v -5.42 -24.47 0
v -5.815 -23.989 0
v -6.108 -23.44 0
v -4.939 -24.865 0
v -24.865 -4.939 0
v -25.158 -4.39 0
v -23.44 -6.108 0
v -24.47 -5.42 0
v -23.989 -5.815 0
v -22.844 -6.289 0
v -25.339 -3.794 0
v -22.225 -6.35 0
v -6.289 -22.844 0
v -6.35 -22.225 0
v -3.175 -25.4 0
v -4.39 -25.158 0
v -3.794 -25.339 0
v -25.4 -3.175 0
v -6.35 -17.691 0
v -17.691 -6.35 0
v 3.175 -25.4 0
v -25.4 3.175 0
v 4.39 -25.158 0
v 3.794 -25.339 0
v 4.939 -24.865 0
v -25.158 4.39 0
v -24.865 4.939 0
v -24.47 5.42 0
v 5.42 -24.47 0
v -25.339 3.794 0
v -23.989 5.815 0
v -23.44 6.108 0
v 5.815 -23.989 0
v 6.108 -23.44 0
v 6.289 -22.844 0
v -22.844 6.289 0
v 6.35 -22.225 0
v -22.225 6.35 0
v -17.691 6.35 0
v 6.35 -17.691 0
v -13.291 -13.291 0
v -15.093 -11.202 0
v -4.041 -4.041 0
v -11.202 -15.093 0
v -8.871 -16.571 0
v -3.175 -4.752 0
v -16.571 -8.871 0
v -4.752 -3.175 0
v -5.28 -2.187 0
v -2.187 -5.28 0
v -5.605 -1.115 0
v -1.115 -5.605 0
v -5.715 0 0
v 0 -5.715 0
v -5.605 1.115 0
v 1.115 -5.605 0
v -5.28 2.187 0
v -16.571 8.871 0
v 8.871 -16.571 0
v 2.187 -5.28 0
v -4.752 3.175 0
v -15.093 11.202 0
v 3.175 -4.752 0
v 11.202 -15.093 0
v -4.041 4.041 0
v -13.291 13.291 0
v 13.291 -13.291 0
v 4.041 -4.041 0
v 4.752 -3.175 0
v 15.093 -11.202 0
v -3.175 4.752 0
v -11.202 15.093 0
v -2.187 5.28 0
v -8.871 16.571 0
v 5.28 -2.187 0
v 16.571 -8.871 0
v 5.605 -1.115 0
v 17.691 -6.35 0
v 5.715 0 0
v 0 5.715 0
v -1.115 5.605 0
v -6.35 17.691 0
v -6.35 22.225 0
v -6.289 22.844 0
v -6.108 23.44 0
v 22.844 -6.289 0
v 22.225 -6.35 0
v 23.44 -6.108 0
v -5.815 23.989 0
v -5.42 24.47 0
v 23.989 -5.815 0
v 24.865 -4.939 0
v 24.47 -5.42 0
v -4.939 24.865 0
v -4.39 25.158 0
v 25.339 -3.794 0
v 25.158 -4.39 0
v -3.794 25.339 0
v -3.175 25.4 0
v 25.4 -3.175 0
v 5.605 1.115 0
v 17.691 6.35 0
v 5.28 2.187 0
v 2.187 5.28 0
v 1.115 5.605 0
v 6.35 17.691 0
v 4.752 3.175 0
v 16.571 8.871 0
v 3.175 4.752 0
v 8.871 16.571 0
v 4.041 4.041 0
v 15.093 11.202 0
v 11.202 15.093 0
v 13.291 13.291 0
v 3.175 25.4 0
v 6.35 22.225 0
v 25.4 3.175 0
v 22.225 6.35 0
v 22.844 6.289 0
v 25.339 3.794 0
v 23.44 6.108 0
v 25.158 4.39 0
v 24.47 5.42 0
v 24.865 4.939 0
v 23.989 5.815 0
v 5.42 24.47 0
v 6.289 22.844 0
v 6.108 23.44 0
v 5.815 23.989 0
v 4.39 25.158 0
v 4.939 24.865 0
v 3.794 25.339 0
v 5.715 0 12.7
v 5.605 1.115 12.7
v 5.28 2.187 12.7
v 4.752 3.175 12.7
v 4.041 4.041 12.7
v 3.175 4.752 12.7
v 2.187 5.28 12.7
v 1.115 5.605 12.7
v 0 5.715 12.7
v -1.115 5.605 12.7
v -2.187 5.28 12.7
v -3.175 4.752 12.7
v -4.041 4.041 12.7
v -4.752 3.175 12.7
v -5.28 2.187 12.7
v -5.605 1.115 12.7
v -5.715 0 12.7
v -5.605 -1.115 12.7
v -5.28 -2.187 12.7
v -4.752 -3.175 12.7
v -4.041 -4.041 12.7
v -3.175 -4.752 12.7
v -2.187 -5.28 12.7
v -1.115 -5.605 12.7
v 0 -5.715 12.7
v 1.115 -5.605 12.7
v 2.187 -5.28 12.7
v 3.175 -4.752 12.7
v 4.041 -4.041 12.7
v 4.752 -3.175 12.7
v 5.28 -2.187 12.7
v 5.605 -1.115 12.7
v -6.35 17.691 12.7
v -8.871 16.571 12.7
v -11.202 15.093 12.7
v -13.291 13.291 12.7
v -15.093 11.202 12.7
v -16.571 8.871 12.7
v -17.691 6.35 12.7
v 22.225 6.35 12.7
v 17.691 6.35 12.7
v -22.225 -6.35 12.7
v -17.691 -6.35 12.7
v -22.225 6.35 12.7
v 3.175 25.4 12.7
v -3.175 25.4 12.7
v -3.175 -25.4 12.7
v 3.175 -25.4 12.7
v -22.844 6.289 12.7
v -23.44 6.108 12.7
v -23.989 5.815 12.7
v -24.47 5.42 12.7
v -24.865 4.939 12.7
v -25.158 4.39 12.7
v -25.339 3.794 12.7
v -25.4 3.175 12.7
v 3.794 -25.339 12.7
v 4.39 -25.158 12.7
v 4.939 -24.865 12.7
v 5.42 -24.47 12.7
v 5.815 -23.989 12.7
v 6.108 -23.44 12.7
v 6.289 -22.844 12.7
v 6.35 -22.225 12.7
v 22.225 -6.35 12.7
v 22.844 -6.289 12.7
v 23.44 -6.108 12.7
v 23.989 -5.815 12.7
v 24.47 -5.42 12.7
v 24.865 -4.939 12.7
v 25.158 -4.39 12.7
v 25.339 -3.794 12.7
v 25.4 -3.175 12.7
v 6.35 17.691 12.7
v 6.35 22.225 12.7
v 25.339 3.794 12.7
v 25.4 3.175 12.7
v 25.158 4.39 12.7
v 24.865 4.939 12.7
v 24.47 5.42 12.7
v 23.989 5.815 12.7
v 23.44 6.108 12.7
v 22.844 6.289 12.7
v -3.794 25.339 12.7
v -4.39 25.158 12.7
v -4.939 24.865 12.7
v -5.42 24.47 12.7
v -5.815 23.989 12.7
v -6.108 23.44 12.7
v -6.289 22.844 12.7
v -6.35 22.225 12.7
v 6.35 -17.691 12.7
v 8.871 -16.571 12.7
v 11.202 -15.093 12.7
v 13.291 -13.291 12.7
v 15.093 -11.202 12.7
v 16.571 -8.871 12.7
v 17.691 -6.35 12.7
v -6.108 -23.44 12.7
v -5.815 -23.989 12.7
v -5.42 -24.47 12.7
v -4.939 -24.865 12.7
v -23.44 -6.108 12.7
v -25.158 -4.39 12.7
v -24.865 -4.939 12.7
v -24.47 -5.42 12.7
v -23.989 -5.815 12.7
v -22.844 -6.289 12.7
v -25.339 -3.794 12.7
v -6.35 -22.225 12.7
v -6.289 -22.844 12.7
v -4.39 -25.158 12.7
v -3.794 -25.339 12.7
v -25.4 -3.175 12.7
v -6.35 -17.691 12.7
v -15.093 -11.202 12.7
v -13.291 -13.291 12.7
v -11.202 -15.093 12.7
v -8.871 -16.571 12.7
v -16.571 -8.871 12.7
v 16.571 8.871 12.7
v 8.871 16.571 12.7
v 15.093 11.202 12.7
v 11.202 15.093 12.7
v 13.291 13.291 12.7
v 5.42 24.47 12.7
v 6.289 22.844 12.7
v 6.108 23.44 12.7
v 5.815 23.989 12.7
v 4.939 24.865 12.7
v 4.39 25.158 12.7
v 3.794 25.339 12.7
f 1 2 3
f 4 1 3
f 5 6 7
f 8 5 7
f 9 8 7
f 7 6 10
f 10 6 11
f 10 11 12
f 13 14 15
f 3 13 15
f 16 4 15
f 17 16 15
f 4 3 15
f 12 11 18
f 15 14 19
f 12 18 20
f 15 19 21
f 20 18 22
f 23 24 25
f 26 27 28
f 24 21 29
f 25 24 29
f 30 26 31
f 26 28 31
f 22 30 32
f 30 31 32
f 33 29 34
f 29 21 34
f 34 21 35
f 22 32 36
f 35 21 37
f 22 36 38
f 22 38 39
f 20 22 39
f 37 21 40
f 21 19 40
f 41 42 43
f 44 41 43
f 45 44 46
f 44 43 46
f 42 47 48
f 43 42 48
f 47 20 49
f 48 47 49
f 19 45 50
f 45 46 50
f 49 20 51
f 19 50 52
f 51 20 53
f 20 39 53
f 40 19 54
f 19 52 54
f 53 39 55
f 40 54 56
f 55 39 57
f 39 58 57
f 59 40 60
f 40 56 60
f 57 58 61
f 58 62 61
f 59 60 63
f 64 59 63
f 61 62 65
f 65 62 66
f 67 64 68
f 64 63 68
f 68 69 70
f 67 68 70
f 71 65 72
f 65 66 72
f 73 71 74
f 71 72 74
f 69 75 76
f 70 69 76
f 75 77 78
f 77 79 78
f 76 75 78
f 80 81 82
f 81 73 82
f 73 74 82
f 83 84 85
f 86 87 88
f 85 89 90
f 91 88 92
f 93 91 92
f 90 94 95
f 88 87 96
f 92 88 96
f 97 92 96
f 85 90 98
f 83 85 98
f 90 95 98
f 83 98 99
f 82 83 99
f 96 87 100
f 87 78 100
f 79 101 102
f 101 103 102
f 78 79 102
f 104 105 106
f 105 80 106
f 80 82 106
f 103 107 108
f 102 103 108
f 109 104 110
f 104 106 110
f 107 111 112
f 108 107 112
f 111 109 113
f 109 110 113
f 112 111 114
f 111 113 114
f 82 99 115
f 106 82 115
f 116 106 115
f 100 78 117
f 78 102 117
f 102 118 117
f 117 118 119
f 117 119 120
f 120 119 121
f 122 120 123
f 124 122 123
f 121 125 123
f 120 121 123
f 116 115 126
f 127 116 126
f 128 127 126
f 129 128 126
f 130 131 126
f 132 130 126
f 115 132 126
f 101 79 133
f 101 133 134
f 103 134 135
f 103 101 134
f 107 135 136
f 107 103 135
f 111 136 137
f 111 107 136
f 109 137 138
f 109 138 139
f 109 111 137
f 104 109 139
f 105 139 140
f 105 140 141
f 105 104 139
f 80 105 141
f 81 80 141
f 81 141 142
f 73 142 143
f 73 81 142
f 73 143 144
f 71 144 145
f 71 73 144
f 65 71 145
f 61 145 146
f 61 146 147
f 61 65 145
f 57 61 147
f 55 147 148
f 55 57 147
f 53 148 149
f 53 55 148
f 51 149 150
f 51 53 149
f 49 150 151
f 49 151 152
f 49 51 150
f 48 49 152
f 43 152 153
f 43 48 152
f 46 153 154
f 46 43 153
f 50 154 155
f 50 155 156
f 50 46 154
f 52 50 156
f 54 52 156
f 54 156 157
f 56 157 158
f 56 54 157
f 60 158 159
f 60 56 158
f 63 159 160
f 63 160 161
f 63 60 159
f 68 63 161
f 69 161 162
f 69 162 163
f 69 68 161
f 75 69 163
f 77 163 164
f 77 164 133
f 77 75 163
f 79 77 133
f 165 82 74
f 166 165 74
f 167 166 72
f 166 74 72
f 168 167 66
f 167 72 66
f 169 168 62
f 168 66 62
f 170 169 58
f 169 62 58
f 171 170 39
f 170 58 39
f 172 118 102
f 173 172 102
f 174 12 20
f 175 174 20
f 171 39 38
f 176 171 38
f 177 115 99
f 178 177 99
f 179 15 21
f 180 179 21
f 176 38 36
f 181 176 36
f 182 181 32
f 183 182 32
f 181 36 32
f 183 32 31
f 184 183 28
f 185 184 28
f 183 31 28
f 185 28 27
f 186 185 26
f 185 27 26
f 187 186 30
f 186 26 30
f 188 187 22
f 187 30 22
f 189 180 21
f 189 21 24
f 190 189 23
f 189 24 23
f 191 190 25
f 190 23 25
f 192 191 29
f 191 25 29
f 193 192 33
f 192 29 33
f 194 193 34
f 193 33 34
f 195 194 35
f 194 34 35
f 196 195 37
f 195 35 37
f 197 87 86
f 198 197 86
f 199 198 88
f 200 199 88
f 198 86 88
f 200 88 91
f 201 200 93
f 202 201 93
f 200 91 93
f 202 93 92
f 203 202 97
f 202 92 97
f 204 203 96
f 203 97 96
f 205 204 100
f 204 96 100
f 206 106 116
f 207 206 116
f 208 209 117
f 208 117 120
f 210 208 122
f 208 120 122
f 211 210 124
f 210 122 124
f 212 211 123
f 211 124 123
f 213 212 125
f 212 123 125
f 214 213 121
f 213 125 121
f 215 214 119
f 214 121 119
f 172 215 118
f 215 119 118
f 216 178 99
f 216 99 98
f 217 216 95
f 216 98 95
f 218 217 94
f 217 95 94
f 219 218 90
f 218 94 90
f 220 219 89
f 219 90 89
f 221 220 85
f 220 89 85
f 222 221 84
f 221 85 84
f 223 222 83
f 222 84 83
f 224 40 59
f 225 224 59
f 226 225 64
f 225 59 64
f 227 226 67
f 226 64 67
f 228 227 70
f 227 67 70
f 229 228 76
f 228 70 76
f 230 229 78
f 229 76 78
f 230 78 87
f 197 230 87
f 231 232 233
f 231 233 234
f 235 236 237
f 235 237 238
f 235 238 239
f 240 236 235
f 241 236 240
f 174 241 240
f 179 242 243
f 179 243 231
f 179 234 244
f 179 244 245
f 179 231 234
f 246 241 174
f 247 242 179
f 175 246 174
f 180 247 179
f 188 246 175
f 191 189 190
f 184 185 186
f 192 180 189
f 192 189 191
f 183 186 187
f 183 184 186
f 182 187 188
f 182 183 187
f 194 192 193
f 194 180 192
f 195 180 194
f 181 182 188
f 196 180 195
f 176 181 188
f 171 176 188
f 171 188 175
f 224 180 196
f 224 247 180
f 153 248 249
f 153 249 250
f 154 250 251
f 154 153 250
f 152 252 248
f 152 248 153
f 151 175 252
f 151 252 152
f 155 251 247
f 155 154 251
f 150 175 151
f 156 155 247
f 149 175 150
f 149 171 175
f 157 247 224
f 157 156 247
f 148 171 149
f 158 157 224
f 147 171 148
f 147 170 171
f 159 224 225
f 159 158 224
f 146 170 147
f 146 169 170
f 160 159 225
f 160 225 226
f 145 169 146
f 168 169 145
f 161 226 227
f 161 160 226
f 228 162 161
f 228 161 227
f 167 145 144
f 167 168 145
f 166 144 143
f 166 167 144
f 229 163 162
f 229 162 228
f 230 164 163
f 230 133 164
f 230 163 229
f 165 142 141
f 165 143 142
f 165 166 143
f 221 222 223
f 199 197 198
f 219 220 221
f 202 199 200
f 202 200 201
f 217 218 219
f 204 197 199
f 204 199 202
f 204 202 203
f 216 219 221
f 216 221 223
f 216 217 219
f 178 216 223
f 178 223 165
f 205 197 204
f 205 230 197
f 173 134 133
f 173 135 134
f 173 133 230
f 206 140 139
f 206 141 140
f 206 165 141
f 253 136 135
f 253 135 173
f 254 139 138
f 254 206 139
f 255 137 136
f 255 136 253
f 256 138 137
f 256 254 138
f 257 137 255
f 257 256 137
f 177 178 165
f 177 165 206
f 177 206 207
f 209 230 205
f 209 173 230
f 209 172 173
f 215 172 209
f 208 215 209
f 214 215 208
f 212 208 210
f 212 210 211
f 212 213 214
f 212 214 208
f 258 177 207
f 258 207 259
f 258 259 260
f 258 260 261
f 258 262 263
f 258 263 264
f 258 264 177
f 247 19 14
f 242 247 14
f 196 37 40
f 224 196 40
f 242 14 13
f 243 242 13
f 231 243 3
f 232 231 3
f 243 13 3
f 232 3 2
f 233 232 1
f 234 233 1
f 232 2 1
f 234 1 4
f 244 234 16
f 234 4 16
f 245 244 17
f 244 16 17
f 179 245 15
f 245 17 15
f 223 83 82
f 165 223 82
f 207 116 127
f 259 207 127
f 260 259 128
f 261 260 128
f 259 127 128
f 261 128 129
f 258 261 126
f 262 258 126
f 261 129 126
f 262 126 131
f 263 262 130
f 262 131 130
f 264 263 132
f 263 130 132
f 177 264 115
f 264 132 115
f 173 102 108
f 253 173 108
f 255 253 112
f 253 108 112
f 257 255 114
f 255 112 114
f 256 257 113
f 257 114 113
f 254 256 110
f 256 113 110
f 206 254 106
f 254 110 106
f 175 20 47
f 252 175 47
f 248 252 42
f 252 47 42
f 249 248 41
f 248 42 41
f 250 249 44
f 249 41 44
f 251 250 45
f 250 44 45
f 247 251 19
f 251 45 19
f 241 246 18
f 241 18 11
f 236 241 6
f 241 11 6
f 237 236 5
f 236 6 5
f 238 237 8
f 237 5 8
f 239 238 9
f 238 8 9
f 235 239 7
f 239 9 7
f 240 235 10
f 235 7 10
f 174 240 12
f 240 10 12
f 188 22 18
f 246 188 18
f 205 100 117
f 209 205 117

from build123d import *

# Parameters (mm, degrees)
F0_R     = 7.9375
F0_R_2   = 5.715
F1_DEPTH = 12.7


with BuildPart() as f1:
    # F0 (on Top) → F1 (new body)
    with BuildSketch(Plane.XY):
        with BuildLine():
            ThreePointArc((-17.690877, -6.35), (-18.796, 0), (-17.690877, 6.35))
            Line((-17.690877, 6.35), (-22.225, 6.35))
            ThreePointArc((-22.225, 6.35), (-24.470064, 5.420064), (-25.4, 3.175))
            Line((-25.4, 3.175), (-25.4, -3.175))
            ThreePointArc((-25.4, -3.175), (-24.470064, -5.420064), (-22.225, -6.35))
            Line((-22.225, -6.35), (-17.690877, -6.35))
        make_face()
        with BuildLine():
            ThreePointArc((17.690877, -6.35), (18.517658, -3.222724), (18.796, 0))
            ThreePointArc((18.796, 0), (18.517658, 3.222724), (17.690877, 6.35))
            ThreePointArc((17.690877, 6.35), (13.290779, 13.290779), (6.35, 17.690877))
            ThreePointArc((6.35, 17.690877), (0, 18.796), (-6.35, 17.690877))
            ThreePointArc((-6.35, 17.690877), (-13.290779, 13.290779), (-17.690877, 6.35))
            ThreePointArc((-17.690877, 6.35), (-18.796, 0), (-17.690877, -6.35))
            ThreePointArc((-17.690877, -6.35), (-13.290779, -13.290779), (-6.35, -17.690877))
            ThreePointArc((-6.35, -17.690877), (0, -18.796), (6.35, -17.690877))
            ThreePointArc((6.35, -17.690877), (13.290779, -13.290779), (17.690877, -6.35))
        make_face()
        Circle(F0_R, mode=Mode.SUBTRACT)
        with BuildLine():
            ThreePointArc((-6.35, 17.690877), (0, 18.796), (6.35, 17.690877))
            Line((6.35, 17.690877), (6.35, 22.225))
            ThreePointArc((6.35, 22.225), (5.420064, 24.470064), (3.175, 25.4))
            Line((3.175, 25.4), (-3.175, 25.4))
            ThreePointArc((-3.175, 25.4), (-5.420064, 24.470064), (-6.35, 22.225))
            Line((-6.35, 22.225), (-6.35, 17.690877))
        make_face()
        with BuildLine():
            Line((6.35, -22.225), (6.35, -17.690877))
            ThreePointArc((6.35, -17.690877), (0, -18.796), (-6.35, -17.690877))
            Line((-6.35, -17.690877), (-6.35, -22.225))
            ThreePointArc((-6.35, -22.225), (-5.420064, -24.470064), (-3.175, -25.4))
            Line((-3.175, -25.4), (3.175, -25.4))
            ThreePointArc((3.175, -25.4), (5.420064, -24.470064), (6.35, -22.225))
        make_face()
        with BuildLine():
            ThreePointArc((17.690877, 6.35), (18.517658, 3.222724), (18.796, 0))
            ThreePointArc((18.796, 0), (18.517658, -3.222724), (17.690877, -6.35))
            Line((17.690877, -6.35), (22.225, -6.35))
            ThreePointArc((22.225, -6.35), (24.470064, -5.420064), (25.4, -3.175))
            Line((25.4, -3.175), (25.4, 3.175))
            ThreePointArc((25.4, 3.175), (24.470064, 5.420064), (22.225, 6.35))
            Line((22.225, 6.35), (17.690877, 6.35))
        make_face()
        Circle(F0_R)
        Circle(F0_R_2, mode=Mode.SUBTRACT)
    extrude(amount=F1_DEPTH)


solid = f1.part
